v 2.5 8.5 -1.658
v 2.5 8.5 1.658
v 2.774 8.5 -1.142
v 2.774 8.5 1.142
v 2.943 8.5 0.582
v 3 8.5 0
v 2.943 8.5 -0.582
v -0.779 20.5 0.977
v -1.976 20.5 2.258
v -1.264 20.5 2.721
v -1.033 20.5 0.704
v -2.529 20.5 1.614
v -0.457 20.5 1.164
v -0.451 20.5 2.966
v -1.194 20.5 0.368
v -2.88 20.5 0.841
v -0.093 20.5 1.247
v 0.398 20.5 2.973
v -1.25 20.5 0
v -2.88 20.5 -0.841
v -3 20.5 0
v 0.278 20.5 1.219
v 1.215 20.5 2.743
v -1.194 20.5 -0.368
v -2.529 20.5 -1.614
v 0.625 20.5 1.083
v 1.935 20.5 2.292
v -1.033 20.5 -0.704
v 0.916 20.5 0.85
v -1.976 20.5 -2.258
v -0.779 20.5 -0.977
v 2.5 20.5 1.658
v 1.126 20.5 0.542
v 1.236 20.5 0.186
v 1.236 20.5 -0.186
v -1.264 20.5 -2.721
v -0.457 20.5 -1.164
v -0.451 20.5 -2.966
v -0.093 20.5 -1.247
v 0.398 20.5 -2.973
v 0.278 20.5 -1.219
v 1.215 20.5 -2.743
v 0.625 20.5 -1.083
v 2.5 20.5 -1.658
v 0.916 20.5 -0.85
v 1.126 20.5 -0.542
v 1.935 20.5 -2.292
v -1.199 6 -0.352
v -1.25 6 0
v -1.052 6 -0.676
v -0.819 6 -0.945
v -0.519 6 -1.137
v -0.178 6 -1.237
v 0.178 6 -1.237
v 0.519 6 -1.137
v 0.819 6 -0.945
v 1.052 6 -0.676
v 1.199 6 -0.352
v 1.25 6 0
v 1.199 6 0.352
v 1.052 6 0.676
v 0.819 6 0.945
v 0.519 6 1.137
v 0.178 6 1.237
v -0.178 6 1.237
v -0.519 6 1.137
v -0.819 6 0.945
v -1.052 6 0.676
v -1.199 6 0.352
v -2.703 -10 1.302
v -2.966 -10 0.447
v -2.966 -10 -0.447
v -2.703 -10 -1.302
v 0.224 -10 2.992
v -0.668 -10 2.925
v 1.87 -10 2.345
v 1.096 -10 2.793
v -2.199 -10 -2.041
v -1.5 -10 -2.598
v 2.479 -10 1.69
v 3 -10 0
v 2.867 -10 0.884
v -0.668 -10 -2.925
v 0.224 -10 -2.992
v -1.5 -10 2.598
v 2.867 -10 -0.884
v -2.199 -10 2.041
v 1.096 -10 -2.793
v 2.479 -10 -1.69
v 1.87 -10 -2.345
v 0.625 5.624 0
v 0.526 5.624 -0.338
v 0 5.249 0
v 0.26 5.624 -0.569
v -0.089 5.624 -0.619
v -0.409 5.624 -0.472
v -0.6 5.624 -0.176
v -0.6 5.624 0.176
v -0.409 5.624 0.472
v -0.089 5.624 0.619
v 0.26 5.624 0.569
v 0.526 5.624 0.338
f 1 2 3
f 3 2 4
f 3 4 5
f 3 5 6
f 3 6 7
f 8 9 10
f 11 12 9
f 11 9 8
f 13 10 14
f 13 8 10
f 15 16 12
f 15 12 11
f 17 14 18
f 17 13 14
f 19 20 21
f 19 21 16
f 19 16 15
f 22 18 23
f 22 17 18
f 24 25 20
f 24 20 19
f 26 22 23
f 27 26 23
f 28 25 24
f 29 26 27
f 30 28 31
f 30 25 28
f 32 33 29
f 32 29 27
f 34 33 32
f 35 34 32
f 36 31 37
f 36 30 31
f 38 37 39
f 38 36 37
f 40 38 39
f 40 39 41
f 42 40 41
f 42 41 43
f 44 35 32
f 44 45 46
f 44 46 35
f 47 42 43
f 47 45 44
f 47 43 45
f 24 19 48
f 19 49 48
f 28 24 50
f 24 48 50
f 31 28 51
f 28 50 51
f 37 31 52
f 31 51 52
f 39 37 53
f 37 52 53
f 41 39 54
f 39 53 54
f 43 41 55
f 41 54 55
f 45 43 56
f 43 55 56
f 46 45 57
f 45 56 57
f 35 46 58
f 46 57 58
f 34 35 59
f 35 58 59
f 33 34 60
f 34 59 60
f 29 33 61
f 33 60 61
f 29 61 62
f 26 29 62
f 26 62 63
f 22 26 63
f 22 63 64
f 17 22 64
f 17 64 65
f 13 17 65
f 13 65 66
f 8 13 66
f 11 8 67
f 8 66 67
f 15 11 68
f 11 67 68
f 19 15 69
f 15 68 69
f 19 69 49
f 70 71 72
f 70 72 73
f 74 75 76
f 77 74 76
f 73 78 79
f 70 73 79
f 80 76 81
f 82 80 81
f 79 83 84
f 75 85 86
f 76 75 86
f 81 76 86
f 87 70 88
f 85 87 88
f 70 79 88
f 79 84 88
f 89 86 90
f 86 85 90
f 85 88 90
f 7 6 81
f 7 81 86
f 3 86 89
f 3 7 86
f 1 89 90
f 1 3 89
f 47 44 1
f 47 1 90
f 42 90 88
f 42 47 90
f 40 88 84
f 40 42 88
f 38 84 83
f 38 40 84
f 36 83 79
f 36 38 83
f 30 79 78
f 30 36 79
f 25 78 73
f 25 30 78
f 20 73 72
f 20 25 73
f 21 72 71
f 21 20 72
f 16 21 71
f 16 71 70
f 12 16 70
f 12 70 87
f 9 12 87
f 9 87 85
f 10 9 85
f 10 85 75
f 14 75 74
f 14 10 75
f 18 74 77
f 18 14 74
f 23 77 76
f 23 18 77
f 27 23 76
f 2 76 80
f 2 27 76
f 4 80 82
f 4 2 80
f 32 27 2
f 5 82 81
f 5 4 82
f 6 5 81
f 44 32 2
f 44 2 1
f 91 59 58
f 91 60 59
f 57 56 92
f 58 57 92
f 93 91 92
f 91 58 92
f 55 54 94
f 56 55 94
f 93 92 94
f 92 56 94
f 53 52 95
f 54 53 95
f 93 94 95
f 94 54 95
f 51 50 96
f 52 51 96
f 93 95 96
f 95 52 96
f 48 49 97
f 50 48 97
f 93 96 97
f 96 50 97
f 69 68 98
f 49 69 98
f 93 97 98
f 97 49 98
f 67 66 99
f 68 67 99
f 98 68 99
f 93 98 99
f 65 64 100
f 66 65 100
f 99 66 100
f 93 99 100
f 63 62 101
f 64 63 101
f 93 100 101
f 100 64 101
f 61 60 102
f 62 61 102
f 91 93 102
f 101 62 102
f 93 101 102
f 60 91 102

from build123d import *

# Parameters (mm, degrees)
SKETCH1_R                 = 3
SHAFT_DEPTH               = 20.5
SHAFT_DEPTH_BACK          = 10
SKETCH2_W                 = 0.5
SKETCH2_H                 = 6
KEY_DEPTH                 = 12
M3X0_5_TAPPED_HOLE1_D     = 2.5
M3X0_5_TAPPED_HOLE1_DEPTH = 14.5
M3X0_5_TAPPED_HOLE1_TIP   = 0.751075774


with BuildPart() as part:
    # Sketch1 → SHAFT (new body, two sides)
    with BuildSketch(Plane(origin=(0, 0, 0), x_dir=(1, 0, 0), z_dir=(0, 1, 0))) as shaft_sk:
        Circle(SKETCH1_R)
    extrude(amount=SHAFT_DEPTH)
    extrude(shaft_sk.sketch, amount=-SHAFT_DEPTH_BACK)

    # Sketch2 → KEY (cut)
    with BuildSketch(Plane(origin=(0, 20.5, 0), x_dir=(1, 0, 0), z_dir=(0, 1, 0))):
        with Locations((2.75, 0)):
            Rectangle(SKETCH2_W, SKETCH2_H)
    extrude(amount=-KEY_DEPTH, mode=Mode.SUBTRACT)

    # M3x0.5 Tapped Hole1
    with Locations(Plane(origin=(0, 20.5, 0), x_dir=(1, 0, 0), z_dir=(0, 1, 0))):
        with Locations((0, 0)):
            Hole(M3X0_5_TAPPED_HOLE1_D / 2, depth=M3X0_5_TAPPED_HOLE1_DEPTH)
            with Locations((0, 0, -(M3X0_5_TAPPED_HOLE1_DEPTH + M3X0_5_TAPPED_HOLE1_TIP / 2))):  # 118° drill point
                Cone(0, M3X0_5_TAPPED_HOLE1_D / 2, M3X0_5_TAPPED_HOLE1_TIP, mode=Mode.SUBTRACT)


solid = part.part
